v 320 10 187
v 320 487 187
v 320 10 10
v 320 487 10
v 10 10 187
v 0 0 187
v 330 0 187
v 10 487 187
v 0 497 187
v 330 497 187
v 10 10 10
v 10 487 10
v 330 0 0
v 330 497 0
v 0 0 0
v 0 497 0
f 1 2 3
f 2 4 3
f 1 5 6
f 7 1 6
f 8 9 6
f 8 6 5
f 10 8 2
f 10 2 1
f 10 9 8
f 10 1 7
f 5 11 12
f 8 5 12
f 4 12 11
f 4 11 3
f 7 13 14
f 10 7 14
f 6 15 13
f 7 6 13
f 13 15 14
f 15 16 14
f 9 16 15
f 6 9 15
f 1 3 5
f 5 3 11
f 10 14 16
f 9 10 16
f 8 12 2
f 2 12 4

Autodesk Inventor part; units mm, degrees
ref_plane "YZ Plane" through (0, 0, 0) normal (1, 0, 0) x (0, 1, 0)
ref_plane "XZ Plane" through (0, 0, 0) normal (0, 1, 0) x (-1, 0, 0)
ref_plane "XY Plane" through (0, 0, 0) normal (0, 0, 1) x (1, 0, 0)
sketch "Sketch1" plane through (0, 0, 0) normal (0, 0, 1) x (1, 0, 0)
  line L0 (0, 0) -> (330, 0)
  line L1 (330, 0) -> (330, 497)
  line L2 (330, 497) -> (0, 497)
  line L3 (0, 497) -> (0, 0)
  dimension "d0" = 330
  dimension "d1" = 497
extrude "Extrusion1" add sketch "Sketch1" along normal blind 10
sketch "Sketch2" plane through (0, 0, 10) normal (0, 0, 1) x (1, 0, 0)
  line L0 (0, 0) -> (330, 0)
  line L1 (330, 0) -> (330, 497)
  line L2 (330, 497) -> (0, 497)
  line L3 (0, 497) -> (0, 0)
  line L4 (10, 487) -> (320, 487)
  line L5 (320, 487) -> (320, 10)
  line L6 (320, 10) -> (10, 10)
  line L7 (10, 10) -> (10, 487)
  dimension "d4" = 330
  dimension "d5" = 497
  dimension "d6" = 10
extrude "Extrusion2" add sketch "Sketch2" along normal blind 177
properties part number "box_under"
